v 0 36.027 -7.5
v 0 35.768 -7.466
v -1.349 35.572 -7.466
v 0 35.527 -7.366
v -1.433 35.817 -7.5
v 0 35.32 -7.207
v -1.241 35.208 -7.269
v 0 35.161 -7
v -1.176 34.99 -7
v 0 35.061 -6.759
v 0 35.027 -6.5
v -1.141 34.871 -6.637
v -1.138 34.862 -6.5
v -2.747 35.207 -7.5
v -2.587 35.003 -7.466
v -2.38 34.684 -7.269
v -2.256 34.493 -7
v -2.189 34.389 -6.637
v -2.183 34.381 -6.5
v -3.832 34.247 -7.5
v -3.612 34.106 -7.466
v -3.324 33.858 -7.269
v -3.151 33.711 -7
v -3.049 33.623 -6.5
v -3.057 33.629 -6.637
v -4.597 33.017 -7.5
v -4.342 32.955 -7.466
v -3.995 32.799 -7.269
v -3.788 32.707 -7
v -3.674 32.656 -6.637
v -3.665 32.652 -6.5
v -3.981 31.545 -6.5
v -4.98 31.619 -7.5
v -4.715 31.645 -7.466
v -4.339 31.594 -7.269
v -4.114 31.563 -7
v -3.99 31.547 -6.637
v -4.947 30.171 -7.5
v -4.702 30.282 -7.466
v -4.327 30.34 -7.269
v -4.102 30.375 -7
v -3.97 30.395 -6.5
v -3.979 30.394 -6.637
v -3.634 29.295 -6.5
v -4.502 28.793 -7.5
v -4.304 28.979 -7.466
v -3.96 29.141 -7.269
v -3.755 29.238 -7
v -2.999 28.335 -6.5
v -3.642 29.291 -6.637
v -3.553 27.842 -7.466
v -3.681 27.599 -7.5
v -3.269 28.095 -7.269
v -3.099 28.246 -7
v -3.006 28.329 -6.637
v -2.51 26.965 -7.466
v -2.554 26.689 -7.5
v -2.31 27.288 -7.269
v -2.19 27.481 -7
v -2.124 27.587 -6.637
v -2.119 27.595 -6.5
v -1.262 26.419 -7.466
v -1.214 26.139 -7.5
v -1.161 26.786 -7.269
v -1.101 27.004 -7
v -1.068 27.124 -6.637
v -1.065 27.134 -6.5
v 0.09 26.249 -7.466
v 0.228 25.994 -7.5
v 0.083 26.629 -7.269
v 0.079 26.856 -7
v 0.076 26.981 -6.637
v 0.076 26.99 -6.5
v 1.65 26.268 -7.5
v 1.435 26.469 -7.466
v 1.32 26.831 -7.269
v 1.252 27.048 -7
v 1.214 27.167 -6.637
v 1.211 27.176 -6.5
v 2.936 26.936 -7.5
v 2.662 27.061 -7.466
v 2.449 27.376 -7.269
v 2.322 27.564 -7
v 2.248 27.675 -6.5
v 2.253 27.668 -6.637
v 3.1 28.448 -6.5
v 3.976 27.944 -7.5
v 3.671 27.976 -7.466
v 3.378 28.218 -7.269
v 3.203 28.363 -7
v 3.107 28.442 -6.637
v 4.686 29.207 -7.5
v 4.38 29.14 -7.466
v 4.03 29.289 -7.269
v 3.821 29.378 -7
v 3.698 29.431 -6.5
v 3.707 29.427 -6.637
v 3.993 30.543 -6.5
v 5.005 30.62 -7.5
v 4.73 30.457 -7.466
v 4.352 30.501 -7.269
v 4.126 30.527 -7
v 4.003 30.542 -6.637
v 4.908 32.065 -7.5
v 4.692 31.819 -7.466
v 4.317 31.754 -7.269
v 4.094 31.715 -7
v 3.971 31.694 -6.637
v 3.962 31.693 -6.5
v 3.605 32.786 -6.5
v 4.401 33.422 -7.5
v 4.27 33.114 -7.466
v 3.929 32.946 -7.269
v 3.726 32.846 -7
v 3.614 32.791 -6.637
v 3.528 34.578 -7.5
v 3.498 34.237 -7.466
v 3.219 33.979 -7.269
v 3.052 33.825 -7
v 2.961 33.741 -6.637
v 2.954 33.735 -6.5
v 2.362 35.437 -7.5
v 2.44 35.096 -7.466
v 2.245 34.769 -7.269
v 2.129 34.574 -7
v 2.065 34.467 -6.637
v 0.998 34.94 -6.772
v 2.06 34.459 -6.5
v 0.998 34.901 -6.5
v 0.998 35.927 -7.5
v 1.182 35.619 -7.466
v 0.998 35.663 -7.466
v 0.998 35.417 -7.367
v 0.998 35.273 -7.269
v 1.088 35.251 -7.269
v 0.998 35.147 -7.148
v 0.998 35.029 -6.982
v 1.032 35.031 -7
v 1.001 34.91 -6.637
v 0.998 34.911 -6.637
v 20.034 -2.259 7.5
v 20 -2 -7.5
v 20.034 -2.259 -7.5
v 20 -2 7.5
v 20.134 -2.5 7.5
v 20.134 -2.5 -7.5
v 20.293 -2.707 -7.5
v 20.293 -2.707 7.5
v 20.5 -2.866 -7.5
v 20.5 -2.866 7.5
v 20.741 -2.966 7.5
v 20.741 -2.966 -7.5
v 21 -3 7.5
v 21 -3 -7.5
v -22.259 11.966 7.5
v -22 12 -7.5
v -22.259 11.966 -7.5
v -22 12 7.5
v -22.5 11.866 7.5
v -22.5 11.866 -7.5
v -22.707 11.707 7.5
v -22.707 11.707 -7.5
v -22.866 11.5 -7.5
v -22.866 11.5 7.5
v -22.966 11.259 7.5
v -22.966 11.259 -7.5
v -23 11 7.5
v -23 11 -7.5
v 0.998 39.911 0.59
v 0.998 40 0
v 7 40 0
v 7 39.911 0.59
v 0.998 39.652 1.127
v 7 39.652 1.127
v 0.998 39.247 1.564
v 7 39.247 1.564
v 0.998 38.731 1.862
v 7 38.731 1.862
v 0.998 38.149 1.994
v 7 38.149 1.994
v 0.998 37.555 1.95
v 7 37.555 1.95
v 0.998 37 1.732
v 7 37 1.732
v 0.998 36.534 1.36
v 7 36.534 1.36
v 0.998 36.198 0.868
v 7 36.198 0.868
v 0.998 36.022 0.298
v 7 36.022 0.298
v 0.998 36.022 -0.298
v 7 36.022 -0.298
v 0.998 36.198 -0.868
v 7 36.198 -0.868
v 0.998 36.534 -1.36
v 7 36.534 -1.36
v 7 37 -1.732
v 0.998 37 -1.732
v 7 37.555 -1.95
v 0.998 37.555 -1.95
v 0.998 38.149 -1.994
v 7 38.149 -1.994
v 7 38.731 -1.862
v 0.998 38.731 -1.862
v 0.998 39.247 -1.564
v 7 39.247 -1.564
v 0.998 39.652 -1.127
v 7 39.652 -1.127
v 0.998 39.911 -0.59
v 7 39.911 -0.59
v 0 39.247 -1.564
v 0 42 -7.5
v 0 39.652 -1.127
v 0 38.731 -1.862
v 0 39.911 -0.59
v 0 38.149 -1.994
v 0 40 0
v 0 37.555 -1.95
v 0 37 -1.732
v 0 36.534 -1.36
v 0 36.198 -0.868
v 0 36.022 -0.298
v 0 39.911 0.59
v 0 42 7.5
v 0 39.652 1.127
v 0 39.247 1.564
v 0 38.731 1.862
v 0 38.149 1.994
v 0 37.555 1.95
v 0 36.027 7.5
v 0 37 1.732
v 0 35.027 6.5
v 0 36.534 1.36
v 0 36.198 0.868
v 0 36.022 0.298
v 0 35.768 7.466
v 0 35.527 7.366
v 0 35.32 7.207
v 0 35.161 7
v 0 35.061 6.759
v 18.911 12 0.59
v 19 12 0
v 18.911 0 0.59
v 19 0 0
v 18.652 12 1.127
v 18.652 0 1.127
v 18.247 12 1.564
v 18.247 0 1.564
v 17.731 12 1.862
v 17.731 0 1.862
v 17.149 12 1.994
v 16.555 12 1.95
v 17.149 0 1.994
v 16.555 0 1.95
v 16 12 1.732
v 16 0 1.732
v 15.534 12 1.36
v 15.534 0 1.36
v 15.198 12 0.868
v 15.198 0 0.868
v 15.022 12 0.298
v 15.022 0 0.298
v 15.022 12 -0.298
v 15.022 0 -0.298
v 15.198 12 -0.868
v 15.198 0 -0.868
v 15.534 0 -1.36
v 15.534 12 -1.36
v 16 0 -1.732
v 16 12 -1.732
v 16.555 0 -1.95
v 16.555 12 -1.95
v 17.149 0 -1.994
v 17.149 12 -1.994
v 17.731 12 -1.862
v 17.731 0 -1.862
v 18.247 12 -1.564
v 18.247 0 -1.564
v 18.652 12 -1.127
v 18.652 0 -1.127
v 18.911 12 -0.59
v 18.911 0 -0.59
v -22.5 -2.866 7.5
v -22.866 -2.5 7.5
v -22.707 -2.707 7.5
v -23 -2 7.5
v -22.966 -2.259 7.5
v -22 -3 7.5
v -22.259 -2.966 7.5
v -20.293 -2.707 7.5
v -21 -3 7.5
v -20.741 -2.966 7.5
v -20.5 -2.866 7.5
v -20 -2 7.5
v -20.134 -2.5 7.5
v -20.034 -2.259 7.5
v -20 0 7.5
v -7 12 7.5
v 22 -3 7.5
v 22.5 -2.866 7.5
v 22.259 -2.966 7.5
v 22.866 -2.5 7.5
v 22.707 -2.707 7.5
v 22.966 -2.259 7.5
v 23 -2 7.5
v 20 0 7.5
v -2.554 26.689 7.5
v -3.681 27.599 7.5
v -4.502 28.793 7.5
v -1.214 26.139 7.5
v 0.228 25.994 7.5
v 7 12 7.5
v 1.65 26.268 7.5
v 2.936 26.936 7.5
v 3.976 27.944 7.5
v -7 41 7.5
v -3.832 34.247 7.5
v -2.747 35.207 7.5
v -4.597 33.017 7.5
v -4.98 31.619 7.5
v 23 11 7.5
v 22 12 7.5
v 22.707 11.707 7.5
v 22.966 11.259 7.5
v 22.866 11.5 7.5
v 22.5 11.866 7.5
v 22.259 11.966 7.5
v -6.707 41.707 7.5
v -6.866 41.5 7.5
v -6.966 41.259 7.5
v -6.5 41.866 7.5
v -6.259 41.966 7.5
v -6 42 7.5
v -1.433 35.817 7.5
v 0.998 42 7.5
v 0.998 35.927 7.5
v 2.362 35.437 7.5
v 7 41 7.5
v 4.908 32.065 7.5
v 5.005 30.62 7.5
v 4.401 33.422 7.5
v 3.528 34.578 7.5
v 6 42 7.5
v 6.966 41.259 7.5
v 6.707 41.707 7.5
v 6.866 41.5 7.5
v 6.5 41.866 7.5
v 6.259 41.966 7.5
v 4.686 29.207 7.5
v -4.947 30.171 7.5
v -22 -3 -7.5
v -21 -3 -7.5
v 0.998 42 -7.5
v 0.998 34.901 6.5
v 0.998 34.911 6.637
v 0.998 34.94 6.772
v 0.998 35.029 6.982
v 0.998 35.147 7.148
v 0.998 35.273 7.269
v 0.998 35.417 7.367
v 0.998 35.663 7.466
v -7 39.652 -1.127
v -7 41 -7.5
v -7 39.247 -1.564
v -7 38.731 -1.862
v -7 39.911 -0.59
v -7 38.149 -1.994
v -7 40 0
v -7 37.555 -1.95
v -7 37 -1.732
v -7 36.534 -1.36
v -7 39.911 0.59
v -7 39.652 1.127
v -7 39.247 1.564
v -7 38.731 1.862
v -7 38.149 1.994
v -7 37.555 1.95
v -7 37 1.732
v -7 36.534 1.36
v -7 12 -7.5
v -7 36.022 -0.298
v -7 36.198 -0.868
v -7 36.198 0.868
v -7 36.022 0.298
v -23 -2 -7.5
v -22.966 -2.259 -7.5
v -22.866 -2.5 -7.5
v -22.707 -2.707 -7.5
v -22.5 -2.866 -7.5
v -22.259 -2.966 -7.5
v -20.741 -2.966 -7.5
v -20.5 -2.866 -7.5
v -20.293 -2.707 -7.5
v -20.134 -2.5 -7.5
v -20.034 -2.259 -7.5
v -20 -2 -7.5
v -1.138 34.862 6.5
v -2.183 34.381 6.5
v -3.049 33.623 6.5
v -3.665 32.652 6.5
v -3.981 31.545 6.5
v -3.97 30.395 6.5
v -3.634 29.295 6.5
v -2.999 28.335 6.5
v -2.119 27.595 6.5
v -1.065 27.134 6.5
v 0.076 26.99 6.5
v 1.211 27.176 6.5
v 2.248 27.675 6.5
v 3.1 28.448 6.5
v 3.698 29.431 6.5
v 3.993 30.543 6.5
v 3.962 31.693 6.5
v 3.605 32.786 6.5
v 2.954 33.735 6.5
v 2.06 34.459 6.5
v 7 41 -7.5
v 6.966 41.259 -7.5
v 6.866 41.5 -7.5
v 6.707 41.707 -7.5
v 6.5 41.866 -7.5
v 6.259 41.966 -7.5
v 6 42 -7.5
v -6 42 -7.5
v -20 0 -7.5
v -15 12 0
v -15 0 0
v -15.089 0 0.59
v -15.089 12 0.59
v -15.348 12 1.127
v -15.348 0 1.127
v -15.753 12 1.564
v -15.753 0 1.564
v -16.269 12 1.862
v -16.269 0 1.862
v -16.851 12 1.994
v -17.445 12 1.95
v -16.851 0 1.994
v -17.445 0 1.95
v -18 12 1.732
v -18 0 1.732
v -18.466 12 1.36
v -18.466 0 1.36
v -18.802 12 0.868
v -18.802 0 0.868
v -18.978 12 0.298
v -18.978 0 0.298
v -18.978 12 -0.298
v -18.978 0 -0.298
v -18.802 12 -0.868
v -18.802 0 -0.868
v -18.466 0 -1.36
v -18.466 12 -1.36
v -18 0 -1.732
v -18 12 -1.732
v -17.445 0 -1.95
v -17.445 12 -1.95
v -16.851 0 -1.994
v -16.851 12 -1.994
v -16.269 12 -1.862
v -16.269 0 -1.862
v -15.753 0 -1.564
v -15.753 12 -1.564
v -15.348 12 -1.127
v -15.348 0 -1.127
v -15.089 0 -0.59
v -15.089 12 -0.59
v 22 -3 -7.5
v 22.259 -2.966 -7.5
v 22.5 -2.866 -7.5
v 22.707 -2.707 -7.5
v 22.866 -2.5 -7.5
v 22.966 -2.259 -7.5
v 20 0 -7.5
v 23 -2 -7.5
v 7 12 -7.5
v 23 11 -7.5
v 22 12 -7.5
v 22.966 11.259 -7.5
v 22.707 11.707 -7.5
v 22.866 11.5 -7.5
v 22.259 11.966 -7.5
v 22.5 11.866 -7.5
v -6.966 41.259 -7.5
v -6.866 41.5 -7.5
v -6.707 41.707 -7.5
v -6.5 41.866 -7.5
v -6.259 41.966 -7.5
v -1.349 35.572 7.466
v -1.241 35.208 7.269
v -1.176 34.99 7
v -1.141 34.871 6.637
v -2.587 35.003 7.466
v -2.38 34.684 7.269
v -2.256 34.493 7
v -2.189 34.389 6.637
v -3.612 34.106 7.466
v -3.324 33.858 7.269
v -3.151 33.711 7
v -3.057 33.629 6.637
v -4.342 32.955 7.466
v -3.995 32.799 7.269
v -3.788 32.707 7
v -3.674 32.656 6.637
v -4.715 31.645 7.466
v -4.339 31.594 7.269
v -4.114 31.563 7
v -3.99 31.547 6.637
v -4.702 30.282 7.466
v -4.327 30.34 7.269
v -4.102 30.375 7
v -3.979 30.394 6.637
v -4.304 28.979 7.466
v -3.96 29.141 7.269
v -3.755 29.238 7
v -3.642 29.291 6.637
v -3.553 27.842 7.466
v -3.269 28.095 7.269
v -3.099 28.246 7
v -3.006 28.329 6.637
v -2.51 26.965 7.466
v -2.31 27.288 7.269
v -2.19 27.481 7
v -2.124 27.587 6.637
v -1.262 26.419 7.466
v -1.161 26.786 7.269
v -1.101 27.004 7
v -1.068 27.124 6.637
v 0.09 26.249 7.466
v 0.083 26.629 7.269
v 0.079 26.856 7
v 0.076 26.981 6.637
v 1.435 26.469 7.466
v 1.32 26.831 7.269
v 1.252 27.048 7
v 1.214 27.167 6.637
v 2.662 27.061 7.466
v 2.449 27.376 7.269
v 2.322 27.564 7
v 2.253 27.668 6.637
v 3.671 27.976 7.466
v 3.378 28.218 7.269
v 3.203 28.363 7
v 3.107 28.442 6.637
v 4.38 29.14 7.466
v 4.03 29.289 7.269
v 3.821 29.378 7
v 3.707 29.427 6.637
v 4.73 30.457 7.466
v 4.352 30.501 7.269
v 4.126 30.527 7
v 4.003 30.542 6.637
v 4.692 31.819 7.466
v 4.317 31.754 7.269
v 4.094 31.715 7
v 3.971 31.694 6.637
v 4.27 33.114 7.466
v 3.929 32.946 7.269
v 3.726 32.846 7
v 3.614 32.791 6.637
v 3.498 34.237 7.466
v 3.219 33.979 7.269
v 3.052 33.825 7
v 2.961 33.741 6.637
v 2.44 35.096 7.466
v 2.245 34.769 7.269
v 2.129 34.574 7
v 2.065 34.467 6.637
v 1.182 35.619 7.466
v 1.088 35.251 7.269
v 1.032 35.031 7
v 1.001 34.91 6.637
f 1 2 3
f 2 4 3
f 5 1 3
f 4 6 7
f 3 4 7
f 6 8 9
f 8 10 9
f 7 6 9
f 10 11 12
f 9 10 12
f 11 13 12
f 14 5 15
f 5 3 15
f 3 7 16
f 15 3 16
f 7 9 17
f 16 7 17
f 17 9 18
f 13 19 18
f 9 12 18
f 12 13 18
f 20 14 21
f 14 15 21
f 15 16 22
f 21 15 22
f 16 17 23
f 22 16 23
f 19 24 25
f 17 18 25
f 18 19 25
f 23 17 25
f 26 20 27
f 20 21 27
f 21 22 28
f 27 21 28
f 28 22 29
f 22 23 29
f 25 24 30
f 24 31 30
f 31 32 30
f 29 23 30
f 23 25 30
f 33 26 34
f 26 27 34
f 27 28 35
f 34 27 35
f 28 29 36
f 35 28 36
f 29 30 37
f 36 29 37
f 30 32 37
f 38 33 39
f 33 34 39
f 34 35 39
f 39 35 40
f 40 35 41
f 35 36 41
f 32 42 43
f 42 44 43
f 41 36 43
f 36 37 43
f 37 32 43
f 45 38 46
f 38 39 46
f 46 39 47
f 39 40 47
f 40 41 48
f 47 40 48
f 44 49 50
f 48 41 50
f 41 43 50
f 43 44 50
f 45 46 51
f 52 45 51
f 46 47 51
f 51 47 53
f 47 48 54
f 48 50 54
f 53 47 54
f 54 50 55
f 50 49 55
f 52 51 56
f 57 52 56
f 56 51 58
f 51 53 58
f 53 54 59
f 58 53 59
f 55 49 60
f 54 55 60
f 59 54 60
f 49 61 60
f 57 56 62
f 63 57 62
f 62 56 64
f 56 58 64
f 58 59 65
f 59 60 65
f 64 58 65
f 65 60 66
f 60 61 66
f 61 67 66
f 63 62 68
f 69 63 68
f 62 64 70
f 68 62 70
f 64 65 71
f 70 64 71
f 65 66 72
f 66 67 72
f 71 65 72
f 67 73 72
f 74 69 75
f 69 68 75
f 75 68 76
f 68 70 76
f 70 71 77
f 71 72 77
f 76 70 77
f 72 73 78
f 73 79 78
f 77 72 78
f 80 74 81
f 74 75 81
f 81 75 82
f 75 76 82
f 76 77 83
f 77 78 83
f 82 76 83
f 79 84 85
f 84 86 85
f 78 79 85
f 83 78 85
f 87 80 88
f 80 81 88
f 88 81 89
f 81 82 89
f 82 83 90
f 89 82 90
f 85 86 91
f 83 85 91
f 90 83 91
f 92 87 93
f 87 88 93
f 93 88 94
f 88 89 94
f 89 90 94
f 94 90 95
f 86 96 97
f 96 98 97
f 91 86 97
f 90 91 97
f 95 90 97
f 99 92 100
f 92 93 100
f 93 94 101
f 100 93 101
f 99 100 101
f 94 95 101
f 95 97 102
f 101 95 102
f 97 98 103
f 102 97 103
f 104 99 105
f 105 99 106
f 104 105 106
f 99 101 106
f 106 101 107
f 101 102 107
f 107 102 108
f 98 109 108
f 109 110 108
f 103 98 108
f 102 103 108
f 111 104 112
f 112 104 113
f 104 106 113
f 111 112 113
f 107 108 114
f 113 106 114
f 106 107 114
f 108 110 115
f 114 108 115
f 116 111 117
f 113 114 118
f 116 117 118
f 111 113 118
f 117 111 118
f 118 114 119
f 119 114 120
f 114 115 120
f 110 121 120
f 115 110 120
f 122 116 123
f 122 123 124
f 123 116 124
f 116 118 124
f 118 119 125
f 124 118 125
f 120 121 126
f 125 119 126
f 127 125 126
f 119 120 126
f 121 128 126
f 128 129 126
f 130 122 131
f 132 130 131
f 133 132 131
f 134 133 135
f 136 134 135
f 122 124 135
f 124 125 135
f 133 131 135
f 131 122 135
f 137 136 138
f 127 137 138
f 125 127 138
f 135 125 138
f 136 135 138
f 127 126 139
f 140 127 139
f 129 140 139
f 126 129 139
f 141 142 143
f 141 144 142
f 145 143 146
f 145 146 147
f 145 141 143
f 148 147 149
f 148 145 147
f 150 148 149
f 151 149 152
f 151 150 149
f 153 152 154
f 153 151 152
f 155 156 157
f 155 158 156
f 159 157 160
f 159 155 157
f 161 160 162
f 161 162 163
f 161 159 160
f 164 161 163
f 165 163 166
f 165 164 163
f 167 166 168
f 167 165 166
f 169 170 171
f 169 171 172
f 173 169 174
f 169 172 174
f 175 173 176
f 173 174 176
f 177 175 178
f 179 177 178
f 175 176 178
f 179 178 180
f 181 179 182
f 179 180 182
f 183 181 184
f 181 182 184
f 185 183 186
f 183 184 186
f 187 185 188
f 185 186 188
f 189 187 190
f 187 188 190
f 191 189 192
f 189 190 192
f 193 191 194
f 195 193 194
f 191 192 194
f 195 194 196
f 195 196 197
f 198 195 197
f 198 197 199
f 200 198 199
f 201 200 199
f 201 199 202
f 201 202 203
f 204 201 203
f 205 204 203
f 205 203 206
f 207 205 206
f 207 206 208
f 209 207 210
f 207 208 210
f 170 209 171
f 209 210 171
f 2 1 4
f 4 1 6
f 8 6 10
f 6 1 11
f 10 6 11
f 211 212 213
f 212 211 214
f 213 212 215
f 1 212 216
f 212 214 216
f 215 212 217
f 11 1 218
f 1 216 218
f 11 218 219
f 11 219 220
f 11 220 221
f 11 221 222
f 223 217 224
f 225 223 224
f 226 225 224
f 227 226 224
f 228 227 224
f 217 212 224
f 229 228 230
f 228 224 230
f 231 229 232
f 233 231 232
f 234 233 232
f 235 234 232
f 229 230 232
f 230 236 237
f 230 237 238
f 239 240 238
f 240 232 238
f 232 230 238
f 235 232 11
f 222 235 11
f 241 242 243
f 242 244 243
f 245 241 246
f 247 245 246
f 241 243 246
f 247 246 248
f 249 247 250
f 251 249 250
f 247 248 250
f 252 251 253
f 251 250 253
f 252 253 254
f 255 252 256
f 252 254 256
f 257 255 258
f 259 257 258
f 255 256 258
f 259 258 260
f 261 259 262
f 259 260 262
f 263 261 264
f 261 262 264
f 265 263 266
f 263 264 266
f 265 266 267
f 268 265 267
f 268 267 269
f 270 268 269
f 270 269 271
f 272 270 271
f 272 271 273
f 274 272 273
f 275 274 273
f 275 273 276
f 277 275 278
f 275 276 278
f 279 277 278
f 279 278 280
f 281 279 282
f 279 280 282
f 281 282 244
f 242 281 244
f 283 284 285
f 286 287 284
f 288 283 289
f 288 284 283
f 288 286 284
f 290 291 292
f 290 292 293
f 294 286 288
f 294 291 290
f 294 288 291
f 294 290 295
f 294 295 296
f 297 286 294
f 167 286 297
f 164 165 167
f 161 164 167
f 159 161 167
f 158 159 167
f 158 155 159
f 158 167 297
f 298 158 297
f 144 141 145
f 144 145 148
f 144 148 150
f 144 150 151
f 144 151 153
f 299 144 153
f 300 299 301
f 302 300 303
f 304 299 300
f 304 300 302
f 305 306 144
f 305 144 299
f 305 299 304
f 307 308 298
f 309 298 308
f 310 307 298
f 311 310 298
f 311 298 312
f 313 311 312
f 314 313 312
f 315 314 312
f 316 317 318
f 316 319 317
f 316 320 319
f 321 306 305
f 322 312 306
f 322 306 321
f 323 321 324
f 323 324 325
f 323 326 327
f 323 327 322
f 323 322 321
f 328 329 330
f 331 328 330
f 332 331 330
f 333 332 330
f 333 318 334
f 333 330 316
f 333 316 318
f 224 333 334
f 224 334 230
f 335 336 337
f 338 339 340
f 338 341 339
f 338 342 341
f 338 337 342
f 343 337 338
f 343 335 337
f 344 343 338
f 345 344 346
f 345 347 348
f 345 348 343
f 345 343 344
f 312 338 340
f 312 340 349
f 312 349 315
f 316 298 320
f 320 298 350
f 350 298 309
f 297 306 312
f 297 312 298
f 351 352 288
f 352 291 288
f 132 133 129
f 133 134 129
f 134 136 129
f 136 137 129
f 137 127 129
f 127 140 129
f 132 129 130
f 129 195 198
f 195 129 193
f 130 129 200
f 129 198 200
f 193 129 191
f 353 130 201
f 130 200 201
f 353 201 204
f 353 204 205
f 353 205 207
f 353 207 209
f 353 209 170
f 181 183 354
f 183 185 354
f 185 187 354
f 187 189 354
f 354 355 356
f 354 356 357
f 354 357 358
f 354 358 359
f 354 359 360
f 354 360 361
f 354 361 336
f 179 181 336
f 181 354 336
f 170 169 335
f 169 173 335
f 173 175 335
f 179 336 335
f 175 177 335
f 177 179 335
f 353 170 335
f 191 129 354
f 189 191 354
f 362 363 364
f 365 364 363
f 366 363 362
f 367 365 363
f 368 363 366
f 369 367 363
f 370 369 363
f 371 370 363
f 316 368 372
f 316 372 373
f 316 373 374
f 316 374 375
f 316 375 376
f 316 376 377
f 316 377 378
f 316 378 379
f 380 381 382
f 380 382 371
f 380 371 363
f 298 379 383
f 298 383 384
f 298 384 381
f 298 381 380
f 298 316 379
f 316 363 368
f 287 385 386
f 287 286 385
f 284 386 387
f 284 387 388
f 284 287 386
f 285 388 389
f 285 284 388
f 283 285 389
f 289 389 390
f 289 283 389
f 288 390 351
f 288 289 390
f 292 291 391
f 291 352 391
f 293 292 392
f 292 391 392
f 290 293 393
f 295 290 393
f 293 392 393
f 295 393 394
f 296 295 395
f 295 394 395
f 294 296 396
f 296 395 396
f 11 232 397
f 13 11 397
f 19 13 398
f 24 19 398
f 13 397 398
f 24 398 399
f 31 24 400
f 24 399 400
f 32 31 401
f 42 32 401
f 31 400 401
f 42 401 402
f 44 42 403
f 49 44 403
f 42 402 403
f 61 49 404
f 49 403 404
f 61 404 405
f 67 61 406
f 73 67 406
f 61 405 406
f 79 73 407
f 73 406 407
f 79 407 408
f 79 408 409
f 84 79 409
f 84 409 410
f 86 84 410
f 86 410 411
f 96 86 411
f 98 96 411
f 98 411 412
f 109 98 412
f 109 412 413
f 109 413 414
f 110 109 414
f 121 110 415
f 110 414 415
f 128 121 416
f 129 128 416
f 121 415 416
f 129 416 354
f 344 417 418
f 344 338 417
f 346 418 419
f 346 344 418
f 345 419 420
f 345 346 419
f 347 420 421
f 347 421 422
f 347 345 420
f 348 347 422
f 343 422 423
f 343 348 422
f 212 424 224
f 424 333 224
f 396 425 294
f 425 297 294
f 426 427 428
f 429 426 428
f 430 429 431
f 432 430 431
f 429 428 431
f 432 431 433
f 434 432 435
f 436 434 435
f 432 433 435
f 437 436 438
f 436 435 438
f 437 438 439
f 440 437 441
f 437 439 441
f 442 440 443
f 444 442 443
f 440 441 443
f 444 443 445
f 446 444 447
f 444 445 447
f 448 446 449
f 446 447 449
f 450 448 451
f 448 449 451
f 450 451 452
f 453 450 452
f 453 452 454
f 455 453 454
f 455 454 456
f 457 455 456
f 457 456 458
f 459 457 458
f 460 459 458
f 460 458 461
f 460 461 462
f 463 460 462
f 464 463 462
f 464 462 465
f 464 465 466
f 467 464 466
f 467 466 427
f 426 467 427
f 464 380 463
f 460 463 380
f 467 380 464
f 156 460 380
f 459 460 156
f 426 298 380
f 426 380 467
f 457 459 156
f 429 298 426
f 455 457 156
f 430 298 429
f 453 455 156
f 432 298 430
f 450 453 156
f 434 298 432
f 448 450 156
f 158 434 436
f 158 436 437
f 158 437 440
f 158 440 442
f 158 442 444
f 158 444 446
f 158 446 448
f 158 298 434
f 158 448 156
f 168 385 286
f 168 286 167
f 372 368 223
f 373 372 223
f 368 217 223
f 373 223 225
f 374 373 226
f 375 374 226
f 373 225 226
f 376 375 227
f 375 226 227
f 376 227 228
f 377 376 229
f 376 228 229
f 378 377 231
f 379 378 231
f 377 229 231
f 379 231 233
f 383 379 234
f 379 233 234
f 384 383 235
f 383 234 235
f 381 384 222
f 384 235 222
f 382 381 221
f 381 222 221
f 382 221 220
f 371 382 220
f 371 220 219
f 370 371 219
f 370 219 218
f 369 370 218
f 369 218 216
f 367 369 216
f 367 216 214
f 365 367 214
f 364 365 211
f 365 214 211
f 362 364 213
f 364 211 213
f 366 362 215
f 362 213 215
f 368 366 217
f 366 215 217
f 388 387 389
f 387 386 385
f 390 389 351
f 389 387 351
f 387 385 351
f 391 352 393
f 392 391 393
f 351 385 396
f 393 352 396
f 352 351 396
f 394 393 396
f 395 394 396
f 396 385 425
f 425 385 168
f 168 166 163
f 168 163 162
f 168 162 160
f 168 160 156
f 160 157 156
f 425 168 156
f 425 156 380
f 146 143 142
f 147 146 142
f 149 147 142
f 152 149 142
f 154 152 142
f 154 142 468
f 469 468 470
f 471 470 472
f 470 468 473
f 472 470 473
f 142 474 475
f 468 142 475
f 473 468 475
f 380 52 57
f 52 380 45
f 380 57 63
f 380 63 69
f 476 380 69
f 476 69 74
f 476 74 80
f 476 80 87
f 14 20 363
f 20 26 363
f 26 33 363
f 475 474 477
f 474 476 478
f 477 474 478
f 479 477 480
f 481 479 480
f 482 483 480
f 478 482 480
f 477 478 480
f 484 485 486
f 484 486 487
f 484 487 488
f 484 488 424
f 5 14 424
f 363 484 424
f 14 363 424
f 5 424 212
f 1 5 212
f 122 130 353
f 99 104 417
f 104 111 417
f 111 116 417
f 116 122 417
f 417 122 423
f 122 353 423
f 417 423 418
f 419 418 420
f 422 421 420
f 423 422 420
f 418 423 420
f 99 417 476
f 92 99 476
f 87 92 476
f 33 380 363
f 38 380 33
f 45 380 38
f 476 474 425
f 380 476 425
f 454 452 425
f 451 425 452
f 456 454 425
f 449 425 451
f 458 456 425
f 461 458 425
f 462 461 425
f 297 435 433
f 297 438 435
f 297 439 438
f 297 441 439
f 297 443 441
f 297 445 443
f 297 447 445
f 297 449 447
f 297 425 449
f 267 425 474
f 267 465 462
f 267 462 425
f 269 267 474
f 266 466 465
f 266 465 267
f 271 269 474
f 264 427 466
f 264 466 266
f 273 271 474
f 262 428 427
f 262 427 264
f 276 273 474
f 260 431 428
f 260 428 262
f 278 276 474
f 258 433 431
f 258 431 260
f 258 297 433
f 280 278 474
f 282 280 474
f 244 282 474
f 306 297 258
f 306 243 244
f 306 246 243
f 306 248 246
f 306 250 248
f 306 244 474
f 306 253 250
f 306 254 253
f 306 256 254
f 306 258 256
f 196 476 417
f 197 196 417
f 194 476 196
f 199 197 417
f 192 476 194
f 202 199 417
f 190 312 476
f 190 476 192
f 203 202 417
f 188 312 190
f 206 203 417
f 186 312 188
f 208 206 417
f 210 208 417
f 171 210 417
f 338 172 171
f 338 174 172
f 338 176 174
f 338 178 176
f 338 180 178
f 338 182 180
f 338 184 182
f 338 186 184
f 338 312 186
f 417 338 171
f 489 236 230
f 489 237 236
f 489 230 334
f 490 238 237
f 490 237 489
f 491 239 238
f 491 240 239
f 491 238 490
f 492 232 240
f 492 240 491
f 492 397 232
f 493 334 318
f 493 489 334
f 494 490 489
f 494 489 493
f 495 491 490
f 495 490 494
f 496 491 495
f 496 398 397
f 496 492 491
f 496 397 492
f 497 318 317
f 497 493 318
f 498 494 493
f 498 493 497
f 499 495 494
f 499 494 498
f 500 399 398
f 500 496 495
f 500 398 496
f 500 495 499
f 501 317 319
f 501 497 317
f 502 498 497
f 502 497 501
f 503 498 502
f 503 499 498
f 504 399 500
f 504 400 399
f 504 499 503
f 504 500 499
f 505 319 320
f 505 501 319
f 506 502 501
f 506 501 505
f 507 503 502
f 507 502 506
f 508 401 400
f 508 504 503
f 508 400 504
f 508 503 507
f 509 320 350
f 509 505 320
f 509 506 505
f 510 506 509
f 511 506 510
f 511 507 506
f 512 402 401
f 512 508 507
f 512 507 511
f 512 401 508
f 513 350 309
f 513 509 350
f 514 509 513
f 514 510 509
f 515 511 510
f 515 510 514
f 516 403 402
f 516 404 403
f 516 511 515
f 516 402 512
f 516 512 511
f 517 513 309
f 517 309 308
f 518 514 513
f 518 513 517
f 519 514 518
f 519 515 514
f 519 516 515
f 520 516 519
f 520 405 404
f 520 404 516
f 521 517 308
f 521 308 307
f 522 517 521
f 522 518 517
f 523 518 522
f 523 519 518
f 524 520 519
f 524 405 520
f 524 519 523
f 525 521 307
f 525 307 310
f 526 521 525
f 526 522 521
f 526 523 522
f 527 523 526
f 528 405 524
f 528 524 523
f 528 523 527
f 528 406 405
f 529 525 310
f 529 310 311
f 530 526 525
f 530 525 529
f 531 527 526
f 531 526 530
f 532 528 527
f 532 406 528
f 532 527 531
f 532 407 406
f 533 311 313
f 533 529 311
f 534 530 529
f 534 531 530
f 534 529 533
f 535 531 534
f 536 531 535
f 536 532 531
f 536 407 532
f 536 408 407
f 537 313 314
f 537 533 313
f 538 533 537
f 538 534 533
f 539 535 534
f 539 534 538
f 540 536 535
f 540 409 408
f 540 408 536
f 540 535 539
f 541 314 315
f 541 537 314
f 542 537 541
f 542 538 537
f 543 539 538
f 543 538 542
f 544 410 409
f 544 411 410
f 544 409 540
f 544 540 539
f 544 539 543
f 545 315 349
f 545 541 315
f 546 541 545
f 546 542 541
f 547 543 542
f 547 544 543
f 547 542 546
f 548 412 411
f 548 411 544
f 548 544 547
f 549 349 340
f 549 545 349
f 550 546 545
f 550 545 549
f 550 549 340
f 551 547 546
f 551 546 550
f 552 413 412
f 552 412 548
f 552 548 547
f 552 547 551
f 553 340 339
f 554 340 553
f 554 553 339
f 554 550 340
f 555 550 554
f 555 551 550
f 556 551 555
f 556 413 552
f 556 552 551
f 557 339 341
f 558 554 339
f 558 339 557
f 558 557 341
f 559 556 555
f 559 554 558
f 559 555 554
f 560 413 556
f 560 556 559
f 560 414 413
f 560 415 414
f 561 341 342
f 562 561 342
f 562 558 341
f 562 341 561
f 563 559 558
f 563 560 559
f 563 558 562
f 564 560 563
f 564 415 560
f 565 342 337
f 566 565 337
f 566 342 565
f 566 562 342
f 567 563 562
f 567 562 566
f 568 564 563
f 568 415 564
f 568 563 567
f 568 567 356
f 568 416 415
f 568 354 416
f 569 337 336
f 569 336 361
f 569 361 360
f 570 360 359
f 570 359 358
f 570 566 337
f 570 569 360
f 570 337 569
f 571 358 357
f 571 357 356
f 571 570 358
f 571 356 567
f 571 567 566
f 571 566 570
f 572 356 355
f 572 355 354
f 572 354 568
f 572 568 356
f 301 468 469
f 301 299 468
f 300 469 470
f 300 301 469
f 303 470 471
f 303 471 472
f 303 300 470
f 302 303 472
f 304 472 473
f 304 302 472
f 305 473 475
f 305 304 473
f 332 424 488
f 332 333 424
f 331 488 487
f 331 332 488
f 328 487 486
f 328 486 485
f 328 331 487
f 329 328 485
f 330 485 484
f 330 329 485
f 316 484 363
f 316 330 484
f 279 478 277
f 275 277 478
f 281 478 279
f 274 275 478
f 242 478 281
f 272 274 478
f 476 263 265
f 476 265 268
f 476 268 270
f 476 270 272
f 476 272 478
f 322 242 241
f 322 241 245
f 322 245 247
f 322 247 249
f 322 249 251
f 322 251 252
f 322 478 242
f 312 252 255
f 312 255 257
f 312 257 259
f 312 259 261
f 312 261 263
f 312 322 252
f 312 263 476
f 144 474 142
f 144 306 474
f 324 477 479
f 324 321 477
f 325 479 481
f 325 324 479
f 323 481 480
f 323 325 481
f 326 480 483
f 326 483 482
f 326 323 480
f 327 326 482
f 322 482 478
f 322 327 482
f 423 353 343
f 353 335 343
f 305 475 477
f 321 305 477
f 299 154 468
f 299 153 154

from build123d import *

# Parameters (mm, degrees)
SKETCH002_R  = 2
PAD002_DEPTH = 17.5
SKETCH001_R  = 2
PAD001_DEPTH = 20
PAD_DEPTH    = 7.5
FILLET_R     = 1


with BuildPart() as pad002:
    # Sketch002 → Pad002 (new body, symmetric)
    with BuildSketch(Plane.YZ):
        with Locations((38, 0)):
            Circle(SKETCH002_R)
    extrude(amount=PAD002_DEPTH, both=True)


with BuildPart() as pad001:
    # Sketch001 → Pad001 (new body, symmetric)
    with BuildSketch(Plane.XZ):
        with Locations((-17, 0)):
            Circle(SKETCH001_R)
        with Locations((17, 0)):
            Circle(SKETCH001_R)
    extrude(amount=PAD001_DEPTH, both=True)


with BuildPart() as fillet_body:
    # Sketch → Pad (new body, symmetric)
    with BuildSketch(Plane.XY):
        with BuildLine():
            Line((0, 0), (20, 0))
            Line((20, 0), (20, -3))
            Line((20, -3), (23, -3))
            Line((23, -3), (23, 12))
            Line((23, 12), (7, 12))
            Line((7, 12), (7, 42))
            Line((0.998309, 42), (7, 42))
            Line((0.998309, 34.901094), (0.998309, 42))
            ThreePointArc((0, 35.026635), (-0.499717, 27.020731), (0.998309, 34.901094))
            Line((0, 42), (0, 35.026635))
            Line((-7, 42), (0, 42))
            Line((-7, 42), (-7, 12))
            Line((-7, 12), (-23, 12))
            Line((-23, -3), (-23, 12))
            Line((-20, -3), (-23, -3))
            Line((-20, 0), (-20, -3))
            Line((0, 0), (-20, 0))
        make_face()
    extrude(amount=PAD_DEPTH, both=True)

    # Cut: cut Pad001
    add(pad001.part, mode=Mode.SUBTRACT)

    # Cut001: cut Pad002
    add(pad002.part, mode=Mode.SUBTRACT)

    # Fillet
    fillet_edges = [fillet_body.edges().sort_by_distance(p)[0] for p in [
        (23, -3, 0),
        (20, -3, 0),
        (-20, -3, 0),
        (-23, -3, 0),
        (23, 12, 0),
        (7, 42, 0),
        (-0.499717, 27.020731, 7.5),
        (-23, 12, 0),
        (-7, 42, 0),
        (-0.499717, 27.020731, -7.5),
    ]]
    fillet(fillet_edges, radius=FILLET_R)


solid = fillet_body.part
